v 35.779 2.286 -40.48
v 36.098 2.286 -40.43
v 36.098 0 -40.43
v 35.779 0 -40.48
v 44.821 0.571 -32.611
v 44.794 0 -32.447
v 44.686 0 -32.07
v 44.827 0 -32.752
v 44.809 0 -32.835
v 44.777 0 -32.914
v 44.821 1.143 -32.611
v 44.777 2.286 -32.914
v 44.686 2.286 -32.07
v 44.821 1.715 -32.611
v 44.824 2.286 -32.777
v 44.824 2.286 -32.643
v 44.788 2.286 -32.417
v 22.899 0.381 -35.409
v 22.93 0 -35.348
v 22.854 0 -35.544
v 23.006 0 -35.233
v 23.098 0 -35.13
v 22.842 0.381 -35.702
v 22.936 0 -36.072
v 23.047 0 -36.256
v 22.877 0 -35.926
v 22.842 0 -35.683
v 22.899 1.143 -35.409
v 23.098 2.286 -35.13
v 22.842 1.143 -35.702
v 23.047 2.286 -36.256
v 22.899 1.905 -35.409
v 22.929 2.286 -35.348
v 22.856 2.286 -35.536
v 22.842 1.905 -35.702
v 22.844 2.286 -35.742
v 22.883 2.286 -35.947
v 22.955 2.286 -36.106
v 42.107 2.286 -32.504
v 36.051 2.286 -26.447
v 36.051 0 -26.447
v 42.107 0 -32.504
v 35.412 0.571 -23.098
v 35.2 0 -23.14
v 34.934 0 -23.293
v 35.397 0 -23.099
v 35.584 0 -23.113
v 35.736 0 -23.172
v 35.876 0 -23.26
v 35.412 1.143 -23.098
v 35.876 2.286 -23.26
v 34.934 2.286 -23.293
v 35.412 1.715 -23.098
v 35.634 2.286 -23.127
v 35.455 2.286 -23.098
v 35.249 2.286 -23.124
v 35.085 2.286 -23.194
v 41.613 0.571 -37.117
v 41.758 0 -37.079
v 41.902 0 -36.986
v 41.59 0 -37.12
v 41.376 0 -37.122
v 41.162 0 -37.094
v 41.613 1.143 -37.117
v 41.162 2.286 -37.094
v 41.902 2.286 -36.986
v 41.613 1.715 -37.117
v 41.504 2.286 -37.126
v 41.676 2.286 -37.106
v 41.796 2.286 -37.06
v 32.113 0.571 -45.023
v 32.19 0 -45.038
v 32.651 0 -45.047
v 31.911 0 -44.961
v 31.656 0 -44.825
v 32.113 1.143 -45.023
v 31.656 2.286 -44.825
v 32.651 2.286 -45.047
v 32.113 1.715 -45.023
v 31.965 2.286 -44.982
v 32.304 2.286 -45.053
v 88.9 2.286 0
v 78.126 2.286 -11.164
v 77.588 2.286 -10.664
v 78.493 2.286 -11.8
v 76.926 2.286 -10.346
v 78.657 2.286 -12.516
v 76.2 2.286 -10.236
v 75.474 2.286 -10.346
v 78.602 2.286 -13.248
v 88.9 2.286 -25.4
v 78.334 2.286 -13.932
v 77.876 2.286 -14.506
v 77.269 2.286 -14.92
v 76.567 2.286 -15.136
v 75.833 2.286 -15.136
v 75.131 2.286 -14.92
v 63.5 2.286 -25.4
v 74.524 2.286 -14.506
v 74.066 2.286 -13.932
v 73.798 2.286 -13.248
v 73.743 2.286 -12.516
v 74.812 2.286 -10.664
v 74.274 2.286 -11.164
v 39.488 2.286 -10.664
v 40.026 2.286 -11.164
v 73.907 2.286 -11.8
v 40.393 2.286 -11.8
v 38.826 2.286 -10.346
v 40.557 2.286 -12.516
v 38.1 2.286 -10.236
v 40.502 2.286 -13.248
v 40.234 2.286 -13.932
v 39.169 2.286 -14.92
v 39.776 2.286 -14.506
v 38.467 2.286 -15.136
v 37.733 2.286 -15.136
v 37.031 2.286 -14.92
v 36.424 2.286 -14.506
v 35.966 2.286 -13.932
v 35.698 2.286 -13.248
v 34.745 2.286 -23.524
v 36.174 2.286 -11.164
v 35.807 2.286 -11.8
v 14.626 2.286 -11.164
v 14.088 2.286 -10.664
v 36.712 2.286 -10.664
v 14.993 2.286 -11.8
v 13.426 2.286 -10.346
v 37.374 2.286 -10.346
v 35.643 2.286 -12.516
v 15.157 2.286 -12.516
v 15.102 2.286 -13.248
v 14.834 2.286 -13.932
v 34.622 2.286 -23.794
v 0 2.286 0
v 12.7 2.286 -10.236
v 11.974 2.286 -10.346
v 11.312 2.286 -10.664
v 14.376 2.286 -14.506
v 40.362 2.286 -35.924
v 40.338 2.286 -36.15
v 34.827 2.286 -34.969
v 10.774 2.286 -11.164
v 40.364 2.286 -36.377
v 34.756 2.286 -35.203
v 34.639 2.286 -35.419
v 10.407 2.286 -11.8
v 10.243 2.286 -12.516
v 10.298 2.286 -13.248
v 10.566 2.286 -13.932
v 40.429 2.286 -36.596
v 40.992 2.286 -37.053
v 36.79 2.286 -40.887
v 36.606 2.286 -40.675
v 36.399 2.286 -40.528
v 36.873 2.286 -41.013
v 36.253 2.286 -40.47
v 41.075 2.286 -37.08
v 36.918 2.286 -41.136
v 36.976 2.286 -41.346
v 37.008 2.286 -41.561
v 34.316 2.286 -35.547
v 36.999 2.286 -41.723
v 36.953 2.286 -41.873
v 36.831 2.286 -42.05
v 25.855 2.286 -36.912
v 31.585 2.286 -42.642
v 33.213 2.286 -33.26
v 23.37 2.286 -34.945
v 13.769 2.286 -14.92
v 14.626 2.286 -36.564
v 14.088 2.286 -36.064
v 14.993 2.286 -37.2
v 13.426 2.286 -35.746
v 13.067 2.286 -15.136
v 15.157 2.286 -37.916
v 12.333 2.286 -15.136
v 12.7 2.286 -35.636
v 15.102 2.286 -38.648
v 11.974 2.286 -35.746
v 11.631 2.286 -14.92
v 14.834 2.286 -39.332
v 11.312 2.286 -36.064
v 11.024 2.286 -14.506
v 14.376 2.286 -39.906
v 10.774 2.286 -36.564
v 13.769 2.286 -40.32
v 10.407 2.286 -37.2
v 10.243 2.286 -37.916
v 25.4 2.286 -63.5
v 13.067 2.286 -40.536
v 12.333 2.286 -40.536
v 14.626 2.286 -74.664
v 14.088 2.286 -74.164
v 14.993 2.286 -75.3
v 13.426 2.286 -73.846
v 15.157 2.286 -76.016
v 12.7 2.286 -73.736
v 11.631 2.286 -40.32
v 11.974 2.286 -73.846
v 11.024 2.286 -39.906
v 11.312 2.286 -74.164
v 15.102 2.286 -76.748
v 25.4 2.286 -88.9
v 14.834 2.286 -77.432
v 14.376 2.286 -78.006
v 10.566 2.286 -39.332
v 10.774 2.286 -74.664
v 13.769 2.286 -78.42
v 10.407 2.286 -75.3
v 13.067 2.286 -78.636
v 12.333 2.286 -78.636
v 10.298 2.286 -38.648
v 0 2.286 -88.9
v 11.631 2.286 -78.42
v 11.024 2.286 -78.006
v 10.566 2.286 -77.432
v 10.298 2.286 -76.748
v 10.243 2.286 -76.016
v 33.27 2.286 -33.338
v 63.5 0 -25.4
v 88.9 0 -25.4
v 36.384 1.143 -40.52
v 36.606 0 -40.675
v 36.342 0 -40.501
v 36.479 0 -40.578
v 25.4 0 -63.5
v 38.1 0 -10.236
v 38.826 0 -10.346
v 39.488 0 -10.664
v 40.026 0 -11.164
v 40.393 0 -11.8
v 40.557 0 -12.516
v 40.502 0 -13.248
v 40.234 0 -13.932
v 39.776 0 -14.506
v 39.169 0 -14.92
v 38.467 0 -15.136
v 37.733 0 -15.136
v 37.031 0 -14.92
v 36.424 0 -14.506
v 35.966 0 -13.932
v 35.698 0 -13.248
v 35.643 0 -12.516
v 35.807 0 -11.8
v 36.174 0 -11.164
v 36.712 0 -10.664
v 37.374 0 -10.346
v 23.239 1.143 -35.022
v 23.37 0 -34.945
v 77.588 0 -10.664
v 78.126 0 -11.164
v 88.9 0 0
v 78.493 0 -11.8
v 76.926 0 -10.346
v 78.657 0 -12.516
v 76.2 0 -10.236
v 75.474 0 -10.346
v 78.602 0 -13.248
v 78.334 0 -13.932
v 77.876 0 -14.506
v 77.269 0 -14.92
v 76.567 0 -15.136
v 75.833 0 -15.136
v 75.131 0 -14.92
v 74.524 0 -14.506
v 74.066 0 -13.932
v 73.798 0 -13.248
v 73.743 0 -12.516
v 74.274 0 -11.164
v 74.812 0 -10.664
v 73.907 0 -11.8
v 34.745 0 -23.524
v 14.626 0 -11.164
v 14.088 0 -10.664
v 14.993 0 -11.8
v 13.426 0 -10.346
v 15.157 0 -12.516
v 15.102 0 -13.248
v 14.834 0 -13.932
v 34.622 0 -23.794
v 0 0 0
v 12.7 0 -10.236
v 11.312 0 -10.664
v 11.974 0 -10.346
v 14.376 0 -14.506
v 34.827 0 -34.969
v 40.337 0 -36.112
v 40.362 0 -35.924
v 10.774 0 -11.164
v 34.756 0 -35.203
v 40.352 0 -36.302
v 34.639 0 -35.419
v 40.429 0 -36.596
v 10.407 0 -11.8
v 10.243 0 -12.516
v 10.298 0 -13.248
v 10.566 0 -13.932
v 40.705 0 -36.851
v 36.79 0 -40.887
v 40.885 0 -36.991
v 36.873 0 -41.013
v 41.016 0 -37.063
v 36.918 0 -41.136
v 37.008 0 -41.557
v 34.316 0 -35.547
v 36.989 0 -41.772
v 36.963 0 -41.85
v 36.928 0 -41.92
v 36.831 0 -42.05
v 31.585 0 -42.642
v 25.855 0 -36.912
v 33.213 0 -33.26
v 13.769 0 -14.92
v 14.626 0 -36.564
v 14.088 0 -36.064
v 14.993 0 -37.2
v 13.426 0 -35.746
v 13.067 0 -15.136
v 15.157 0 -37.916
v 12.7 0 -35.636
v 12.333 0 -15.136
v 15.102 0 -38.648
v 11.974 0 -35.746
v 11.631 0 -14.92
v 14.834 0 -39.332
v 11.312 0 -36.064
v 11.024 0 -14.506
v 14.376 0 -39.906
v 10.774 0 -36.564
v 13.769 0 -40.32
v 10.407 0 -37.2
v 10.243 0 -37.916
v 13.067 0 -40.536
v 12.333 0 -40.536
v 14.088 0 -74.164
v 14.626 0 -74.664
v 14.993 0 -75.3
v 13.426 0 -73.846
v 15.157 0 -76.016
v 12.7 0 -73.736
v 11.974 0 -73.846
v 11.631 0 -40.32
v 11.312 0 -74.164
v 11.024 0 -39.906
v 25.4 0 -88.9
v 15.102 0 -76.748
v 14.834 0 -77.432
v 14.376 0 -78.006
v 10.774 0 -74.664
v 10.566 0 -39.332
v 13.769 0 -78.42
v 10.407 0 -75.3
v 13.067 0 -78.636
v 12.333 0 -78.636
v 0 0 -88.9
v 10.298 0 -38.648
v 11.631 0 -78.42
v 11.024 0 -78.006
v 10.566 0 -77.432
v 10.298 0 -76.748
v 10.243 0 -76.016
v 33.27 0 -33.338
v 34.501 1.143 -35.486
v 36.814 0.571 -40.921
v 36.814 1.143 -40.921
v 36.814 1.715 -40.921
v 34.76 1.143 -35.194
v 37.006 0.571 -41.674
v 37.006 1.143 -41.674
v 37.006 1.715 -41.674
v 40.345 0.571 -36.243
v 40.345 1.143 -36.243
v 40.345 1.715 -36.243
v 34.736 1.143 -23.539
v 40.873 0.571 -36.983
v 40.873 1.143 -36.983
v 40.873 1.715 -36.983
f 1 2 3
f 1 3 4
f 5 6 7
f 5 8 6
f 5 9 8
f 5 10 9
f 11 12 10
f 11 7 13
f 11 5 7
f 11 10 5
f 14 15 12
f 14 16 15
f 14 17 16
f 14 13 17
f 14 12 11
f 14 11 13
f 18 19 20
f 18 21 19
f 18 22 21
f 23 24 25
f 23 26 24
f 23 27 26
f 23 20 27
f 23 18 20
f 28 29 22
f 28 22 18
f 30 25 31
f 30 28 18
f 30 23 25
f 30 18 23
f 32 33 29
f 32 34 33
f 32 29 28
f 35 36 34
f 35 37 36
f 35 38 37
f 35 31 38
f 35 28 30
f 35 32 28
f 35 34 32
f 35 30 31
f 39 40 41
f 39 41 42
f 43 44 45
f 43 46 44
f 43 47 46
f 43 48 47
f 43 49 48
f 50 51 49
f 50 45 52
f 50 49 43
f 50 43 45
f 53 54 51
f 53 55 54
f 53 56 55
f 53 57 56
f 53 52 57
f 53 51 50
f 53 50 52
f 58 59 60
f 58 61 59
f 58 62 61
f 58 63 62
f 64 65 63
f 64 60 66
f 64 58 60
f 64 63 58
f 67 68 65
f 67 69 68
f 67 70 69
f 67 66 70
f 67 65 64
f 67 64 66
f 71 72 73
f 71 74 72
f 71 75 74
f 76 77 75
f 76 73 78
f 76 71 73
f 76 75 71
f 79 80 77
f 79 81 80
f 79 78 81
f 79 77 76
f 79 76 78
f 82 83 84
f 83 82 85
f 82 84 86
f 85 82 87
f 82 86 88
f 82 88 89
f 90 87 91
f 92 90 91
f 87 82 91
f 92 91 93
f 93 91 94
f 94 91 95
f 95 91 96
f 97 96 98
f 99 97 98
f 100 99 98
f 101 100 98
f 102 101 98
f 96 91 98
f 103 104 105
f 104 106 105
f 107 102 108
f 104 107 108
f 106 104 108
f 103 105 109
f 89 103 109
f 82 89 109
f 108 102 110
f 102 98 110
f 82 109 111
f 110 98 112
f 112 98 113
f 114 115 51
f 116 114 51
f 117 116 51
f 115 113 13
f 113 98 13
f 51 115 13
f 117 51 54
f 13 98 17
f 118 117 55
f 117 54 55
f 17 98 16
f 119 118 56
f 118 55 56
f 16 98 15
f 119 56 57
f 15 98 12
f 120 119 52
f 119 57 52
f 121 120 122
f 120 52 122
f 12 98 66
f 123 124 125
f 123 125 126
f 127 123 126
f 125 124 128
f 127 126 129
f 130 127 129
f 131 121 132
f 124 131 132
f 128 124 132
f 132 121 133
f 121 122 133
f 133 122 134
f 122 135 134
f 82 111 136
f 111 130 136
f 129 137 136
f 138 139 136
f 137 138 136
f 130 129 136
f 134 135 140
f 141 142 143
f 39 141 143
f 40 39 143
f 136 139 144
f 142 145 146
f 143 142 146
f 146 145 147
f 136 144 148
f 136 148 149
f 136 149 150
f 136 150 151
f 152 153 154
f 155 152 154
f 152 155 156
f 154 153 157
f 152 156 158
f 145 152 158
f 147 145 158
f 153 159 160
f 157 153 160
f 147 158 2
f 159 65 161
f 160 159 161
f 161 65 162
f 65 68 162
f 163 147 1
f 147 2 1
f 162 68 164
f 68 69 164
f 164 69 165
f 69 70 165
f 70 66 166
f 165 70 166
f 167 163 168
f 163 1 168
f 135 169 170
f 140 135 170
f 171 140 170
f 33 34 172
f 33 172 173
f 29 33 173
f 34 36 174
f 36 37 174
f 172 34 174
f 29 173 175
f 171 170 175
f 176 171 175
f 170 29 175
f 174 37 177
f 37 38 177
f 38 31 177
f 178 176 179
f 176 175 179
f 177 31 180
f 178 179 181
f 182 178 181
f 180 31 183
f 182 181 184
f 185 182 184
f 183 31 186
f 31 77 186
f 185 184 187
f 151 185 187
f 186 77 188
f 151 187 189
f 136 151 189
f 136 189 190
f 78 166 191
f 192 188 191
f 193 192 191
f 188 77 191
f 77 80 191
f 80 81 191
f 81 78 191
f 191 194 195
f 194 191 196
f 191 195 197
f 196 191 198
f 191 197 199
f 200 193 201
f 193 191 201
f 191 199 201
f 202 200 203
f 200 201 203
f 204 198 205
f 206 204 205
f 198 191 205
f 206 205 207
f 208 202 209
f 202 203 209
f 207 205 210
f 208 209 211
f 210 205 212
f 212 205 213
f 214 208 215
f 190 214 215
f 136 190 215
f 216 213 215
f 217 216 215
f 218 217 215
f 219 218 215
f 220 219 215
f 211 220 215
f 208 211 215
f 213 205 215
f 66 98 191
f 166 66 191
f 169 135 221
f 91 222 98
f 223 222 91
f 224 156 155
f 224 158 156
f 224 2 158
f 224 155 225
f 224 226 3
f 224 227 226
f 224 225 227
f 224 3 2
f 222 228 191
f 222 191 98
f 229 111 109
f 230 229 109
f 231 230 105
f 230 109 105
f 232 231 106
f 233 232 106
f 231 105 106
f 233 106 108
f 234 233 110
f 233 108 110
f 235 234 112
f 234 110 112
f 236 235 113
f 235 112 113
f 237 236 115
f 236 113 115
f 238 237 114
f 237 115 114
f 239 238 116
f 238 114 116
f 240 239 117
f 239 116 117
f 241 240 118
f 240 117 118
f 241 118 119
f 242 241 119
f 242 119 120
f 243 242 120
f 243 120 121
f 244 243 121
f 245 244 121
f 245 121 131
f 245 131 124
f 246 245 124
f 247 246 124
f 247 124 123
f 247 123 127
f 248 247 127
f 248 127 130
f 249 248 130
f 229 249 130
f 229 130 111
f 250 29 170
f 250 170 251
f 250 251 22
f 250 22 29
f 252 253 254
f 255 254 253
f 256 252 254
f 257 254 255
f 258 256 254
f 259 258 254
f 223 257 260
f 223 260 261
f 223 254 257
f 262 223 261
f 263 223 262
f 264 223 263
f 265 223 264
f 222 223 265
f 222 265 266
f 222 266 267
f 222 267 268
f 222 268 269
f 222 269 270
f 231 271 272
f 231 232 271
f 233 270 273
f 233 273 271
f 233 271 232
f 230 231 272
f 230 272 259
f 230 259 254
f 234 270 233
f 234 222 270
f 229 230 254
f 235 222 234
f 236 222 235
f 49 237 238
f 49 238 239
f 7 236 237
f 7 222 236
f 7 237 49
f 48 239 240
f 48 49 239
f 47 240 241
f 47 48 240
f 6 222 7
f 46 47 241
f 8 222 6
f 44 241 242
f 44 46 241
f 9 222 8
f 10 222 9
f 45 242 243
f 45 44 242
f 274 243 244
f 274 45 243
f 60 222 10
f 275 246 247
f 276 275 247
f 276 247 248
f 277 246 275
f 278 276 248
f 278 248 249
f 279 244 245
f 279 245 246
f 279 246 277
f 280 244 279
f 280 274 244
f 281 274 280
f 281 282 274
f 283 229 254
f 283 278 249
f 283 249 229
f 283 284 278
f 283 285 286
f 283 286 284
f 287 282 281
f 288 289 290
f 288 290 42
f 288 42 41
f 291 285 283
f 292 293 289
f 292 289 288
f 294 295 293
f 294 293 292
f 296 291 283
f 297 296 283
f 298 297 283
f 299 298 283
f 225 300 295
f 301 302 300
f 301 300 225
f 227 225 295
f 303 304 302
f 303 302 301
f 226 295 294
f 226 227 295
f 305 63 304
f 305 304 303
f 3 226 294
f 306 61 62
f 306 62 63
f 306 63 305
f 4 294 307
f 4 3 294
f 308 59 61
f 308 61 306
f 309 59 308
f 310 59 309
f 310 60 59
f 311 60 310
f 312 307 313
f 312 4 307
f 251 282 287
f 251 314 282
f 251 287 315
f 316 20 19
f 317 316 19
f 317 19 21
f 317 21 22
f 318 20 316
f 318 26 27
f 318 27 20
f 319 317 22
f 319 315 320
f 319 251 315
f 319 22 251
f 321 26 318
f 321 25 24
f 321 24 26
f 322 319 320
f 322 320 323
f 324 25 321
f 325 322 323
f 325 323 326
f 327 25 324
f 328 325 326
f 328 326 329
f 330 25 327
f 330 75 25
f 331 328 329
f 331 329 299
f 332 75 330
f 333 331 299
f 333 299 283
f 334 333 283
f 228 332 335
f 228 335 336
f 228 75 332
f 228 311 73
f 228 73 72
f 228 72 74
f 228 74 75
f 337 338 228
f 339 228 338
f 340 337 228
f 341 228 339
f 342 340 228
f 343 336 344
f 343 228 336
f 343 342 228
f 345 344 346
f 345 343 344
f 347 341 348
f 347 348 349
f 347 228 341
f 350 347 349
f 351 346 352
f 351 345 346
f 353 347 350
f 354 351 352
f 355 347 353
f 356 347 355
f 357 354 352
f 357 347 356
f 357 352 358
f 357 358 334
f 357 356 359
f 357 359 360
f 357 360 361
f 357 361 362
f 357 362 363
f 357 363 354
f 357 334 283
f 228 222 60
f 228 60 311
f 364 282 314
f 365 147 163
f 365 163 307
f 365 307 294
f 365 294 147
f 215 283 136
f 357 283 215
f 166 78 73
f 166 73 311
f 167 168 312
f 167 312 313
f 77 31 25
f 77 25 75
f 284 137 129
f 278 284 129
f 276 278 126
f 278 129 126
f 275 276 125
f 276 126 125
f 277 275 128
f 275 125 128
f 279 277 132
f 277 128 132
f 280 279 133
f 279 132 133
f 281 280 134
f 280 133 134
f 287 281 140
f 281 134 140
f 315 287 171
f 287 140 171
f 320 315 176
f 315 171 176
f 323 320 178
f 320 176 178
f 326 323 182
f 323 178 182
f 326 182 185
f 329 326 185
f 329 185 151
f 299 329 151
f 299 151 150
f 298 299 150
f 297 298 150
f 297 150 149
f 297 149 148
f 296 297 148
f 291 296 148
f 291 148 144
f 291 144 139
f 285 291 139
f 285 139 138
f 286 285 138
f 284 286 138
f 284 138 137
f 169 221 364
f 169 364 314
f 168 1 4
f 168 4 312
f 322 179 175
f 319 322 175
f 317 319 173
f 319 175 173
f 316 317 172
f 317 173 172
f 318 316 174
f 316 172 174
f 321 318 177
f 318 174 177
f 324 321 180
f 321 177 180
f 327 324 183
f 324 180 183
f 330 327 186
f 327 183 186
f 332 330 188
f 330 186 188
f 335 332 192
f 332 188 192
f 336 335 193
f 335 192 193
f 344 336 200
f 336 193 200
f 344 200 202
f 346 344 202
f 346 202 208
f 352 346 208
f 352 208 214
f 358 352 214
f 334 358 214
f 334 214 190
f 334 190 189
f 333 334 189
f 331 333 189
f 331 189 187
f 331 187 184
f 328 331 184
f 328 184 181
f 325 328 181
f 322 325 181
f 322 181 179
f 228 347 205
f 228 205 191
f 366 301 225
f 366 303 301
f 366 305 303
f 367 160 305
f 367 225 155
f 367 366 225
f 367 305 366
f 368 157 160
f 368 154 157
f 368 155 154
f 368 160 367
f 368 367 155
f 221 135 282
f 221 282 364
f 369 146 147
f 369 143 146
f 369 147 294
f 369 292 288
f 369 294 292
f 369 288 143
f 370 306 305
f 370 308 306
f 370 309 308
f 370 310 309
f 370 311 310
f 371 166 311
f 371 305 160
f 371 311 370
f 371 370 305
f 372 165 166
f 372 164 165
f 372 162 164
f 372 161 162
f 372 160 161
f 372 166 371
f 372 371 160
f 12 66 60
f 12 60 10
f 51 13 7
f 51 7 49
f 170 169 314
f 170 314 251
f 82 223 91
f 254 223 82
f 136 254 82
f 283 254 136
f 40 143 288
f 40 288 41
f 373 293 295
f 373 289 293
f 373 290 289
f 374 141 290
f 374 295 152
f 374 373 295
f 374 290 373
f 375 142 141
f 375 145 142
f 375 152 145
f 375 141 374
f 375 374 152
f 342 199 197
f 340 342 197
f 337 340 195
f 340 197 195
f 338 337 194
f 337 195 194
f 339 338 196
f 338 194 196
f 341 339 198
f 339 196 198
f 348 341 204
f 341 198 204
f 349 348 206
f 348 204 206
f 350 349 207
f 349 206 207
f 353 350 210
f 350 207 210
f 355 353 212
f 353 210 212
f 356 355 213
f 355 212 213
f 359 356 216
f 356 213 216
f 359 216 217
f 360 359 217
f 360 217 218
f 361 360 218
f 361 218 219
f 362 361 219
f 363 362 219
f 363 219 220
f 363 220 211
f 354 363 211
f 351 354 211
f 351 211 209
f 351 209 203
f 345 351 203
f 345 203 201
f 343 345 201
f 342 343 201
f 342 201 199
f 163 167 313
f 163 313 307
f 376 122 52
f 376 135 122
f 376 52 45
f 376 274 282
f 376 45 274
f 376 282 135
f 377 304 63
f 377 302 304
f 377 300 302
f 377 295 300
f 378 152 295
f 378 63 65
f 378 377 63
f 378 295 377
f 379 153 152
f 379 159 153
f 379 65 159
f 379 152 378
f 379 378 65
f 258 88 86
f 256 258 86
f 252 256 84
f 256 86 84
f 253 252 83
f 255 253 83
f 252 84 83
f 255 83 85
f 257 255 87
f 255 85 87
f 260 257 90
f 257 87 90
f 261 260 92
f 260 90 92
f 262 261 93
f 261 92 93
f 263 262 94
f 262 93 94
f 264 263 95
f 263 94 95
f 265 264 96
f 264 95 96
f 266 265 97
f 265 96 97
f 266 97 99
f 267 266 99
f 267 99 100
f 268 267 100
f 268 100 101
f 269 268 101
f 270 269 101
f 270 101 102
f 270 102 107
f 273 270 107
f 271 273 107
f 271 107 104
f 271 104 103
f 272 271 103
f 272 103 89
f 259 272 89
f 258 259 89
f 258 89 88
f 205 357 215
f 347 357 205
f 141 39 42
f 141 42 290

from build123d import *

# Parameters (mm, degrees)
BOSS_EXTRUDE1_DEPTH = 2.286
CUT_EXTRUDE1_DEPTH  = 126.744366856
SKETCH3_R           = 2.4638
CUT_EXTRUDE2_DEPTH  = 126.744366999


with BuildPart() as part:
    # Sketch1 → Boss-Extrude1 (new body)
    with BuildSketch(Plane(origin=(0, 0, 0), x_dir=(1, 0, 0), z_dir=(0, 1, 0))):
        Polygon((25.4, 63.5), (63.5, 25.4), (88.9, 25.4), (88.9, 0), (0, 0), (0, 88.9), (25.4, 88.9), align=None)
    extrude(amount=BOSS_EXTRUDE1_DEPTH)

    # Sketch2 → Cut-Extrude1 (cut, through all)
    with BuildSketch(Plane(origin=(0, 2.286, 0), x_dir=(1, 0, 0), z_dir=(0, 1, 0))):
        with BuildLine():
            add(Edge.make_bspline(
                [(31.65582917, 44.824706507), (31.72721015, 44.868168803), (31.870288171, 44.955285838), (32.115061475, 45.030799557), (32.37800112, 45.066201469), (32.558110333, 45.05330926), (32.651195267, 45.046646245)],
                knots=[0, 0, 0, 0, 0.959878879, 1.924007909, 2.927075513, 4, 4, 4, 4], degree=3))
            Line((32.651195267, 45.046646245), (36.831060331, 42.050459784))
            add(Edge.make_bspline(
                [(36.831060331, 42.050459784), (36.874582097, 41.996816639), (36.963947184, 41.886668896), (37.019807322, 41.663032648), (36.998735396, 41.406700154), (36.946797609, 41.231360456), (36.918491136, 41.135799046)],
                knots=[0, 0, 0, 0, 0.847093379, 1.739372747, 2.767941704, 4, 4, 4, 4], degree=3))
            add(Edge.make_bspline(
                [(36.918491136, 41.135799046), (36.907659111, 41.100371643), (36.884120075, 41.023384482), (36.811679346, 40.91436251), (36.720386672, 40.794599967), (36.64589915, 40.716950958), (36.605757869, 40.675105953)],
                knots=[0, 0, 0, 0, 0.786237394, 1.708569685, 2.765149586, 4, 4, 4, 4], degree=3))
            add(Edge.make_bspline(
                [(36.605757869, 40.675105953), (36.534614921, 40.6177911), (36.384603144, 40.496937196), (36.196750402, 40.452821185), (36.097986651, 40.429627152)],
                knots=[0, 0, 0, 0, 0.948498166, 2, 2, 2, 2], degree=3))
            Line((36.097986651, 40.429627152), (35.778527937, 40.480068002))
            Line((35.778527937, 40.480068002), (31.58521198, 42.642299085))
            Line((31.58521198, 42.642299085), (25.855131474, 36.912218579))
            Line((25.855131474, 36.912218579), (34.315743301, 35.546952919))
            add(Edge.make_bspline(
                [(34.315743301, 35.546952919), (34.378329612, 35.529086939), (34.490251228, 35.497137631), (34.593189369, 35.443023199), (34.638564738, 35.419169433)],
                knots=[0, 0, 0, 0, 1.11839541, 2, 2, 2, 2], degree=3))
            add(Edge.make_bspline(
                [(34.638564738, 35.419169433), (34.683076904, 35.345786024), (34.768509207, 35.204941079), (34.807974339, 35.045116744), (34.826877243, 34.968564511)],
                knots=[0, 0, 0, 0, 1.042045342, 2, 2, 2, 2], degree=3))
            Line((34.826877243, 34.968564511), (36.050908525, 26.447423665))
            Line((36.050908525, 26.447423665), (42.107173191, 32.503688331))
            Line((42.107173191, 32.503688331), (40.361919797, 35.923577928))
            add(Edge.make_bspline(
                [(40.361919797, 35.923577928), (40.351753136, 35.974985176), (40.330871112, 36.080574163), (40.3439389, 36.246210329), (40.367095634, 36.421433735), (40.407855126, 36.536130678), (40.429174263, 36.596122589)],
                knots=[0, 0, 0, 0, 0.913209557, 1.875705789, 2.888893945, 4, 4, 4, 4], degree=3))
            add(Edge.make_bspline(
                [(40.429174263, 36.596122589), (40.509009346, 36.672362665), (40.651215954, 36.808165651), (40.849356719, 36.972690697), (41.015708613, 37.074515143), (41.12005501, 37.088251343), (41.162247943, 37.093805637)],
                knots=[0, 0, 0, 0, 1.466202942, 2.611680716, 3.438626887, 4, 4, 4, 4], degree=3))
            add(Edge.make_bspline(
                [(41.162247943, 37.093805637), (41.243888372, 37.10647383), (41.393272638, 37.129653873), (41.601794633, 37.125883922), (41.776610643, 37.083447982), (41.862114812, 37.017157534), (41.902047069, 36.986198492)],
                knots=[0, 0, 0, 0, 1.278063421, 2.338578655, 3.224081066, 4, 4, 4, 4], degree=3))
            Line((41.902047069, 36.986198492), (44.777175492, 32.913940573))
            add(Edge.make_bspline(
                [(44.777175492, 32.913940573), (44.794644521, 32.874178054), (44.836759395, 32.778317344), (44.821784918, 32.589132207), (44.777454045, 32.347784995), (44.719281585, 32.170283543), (44.686381963, 32.069897025)],
                knots=[0, 0, 0, 0, 0.592454987, 1.428308758, 2.545571737, 4, 4, 4, 4], degree=3))
            Line((44.686381963, 32.069897025), (35.876046913, 23.259561975))
            add(Edge.make_bspline(
                [(35.876046913, 23.259561975), (35.802583462, 23.210319908), (35.662434184, 23.11637877), (35.410146741, 23.084728901), (35.156417578, 23.137802986), (35.012256253, 23.238737342), (34.934484389, 23.293189208)],
                knots=[0, 0, 0, 0, 1.024762661, 1.954982311, 2.896757927, 4, 4, 4, 4], degree=3))
            add(Edge.make_bspline(
                [(34.934484389, 23.293189208), (34.862211763, 23.371249908), (34.725830705, 23.518553272), (34.655031564, 23.706083117), (34.621751121, 23.79423498)],
                knots=[0, 0, 0, 0, 1.059863105, 2, 2, 2, 2], degree=3))
            Line((34.621751121, 23.79423498), (33.269936354, 33.337643709))
            Line((33.269936354, 33.337643709), (33.212770058, 33.260301073))
            Line((33.212770058, 33.260301073), (23.370078955, 34.945025448))
            add(Edge.make_bspline(
                [(23.370078955, 34.945025448), (23.325591172, 34.969657633), (23.229222166, 35.023015636), (23.143726057, 35.092543958), (23.097698367, 35.129975229)],
                knots=[0, 0, 0, 0, 0.923279883, 2, 2, 2, 2], degree=3))
            add(Edge.make_bspline(
                [(23.097698367, 35.129975229), (23.056477465, 35.174430553), (22.978267135, 35.258777702), (22.896457595, 35.403808998), (22.845356477, 35.551168549), (22.835942364, 35.750716315), (22.882407019, 36.001780496), (22.991741999, 36.170711674), (23.047257518, 36.256487535)],
                knots=[0, 0, 0, 0, 0.874892655, 1.659974428, 2.393902707, 3.109661626, 4.532412633, 6, 6, 6, 6], degree=3))
            Line((23.047257518, 36.256487535), (31.65582917, 44.824706507))
        make_face()
    extrude(amount=-CUT_EXTRUDE1_DEPTH, mode=Mode.SUBTRACT)

    # Sketch3 → Cut-Extrude2 (cut, through all)
    with BuildSketch(Plane(origin=(0, 2.286, 0), x_dir=(1, 0, 0), z_dir=(0, 1, 0))):
        with Locations(Location((76.2, 12.7, 0), (0, 0, 270))):
            Circle(SKETCH3_R)
        with Locations(Location((12.7, 12.7, 0), (0, 0, 270))):
            Circle(SKETCH3_R)
        with Locations(Location((12.7, 76.2, 0), (0, 0, 270))):
            Circle(SKETCH3_R)
        with Locations(Location((12.7, 38.1, 0), (0, 0, 270))):
            Circle(SKETCH3_R)
        with Locations(Location((38.1, 12.7, 0), (0, 0, 270))):
            Circle(SKETCH3_R)
    extrude(amount=-CUT_EXTRUDE2_DEPTH, mode=Mode.SUBTRACT)


solid = part.part
